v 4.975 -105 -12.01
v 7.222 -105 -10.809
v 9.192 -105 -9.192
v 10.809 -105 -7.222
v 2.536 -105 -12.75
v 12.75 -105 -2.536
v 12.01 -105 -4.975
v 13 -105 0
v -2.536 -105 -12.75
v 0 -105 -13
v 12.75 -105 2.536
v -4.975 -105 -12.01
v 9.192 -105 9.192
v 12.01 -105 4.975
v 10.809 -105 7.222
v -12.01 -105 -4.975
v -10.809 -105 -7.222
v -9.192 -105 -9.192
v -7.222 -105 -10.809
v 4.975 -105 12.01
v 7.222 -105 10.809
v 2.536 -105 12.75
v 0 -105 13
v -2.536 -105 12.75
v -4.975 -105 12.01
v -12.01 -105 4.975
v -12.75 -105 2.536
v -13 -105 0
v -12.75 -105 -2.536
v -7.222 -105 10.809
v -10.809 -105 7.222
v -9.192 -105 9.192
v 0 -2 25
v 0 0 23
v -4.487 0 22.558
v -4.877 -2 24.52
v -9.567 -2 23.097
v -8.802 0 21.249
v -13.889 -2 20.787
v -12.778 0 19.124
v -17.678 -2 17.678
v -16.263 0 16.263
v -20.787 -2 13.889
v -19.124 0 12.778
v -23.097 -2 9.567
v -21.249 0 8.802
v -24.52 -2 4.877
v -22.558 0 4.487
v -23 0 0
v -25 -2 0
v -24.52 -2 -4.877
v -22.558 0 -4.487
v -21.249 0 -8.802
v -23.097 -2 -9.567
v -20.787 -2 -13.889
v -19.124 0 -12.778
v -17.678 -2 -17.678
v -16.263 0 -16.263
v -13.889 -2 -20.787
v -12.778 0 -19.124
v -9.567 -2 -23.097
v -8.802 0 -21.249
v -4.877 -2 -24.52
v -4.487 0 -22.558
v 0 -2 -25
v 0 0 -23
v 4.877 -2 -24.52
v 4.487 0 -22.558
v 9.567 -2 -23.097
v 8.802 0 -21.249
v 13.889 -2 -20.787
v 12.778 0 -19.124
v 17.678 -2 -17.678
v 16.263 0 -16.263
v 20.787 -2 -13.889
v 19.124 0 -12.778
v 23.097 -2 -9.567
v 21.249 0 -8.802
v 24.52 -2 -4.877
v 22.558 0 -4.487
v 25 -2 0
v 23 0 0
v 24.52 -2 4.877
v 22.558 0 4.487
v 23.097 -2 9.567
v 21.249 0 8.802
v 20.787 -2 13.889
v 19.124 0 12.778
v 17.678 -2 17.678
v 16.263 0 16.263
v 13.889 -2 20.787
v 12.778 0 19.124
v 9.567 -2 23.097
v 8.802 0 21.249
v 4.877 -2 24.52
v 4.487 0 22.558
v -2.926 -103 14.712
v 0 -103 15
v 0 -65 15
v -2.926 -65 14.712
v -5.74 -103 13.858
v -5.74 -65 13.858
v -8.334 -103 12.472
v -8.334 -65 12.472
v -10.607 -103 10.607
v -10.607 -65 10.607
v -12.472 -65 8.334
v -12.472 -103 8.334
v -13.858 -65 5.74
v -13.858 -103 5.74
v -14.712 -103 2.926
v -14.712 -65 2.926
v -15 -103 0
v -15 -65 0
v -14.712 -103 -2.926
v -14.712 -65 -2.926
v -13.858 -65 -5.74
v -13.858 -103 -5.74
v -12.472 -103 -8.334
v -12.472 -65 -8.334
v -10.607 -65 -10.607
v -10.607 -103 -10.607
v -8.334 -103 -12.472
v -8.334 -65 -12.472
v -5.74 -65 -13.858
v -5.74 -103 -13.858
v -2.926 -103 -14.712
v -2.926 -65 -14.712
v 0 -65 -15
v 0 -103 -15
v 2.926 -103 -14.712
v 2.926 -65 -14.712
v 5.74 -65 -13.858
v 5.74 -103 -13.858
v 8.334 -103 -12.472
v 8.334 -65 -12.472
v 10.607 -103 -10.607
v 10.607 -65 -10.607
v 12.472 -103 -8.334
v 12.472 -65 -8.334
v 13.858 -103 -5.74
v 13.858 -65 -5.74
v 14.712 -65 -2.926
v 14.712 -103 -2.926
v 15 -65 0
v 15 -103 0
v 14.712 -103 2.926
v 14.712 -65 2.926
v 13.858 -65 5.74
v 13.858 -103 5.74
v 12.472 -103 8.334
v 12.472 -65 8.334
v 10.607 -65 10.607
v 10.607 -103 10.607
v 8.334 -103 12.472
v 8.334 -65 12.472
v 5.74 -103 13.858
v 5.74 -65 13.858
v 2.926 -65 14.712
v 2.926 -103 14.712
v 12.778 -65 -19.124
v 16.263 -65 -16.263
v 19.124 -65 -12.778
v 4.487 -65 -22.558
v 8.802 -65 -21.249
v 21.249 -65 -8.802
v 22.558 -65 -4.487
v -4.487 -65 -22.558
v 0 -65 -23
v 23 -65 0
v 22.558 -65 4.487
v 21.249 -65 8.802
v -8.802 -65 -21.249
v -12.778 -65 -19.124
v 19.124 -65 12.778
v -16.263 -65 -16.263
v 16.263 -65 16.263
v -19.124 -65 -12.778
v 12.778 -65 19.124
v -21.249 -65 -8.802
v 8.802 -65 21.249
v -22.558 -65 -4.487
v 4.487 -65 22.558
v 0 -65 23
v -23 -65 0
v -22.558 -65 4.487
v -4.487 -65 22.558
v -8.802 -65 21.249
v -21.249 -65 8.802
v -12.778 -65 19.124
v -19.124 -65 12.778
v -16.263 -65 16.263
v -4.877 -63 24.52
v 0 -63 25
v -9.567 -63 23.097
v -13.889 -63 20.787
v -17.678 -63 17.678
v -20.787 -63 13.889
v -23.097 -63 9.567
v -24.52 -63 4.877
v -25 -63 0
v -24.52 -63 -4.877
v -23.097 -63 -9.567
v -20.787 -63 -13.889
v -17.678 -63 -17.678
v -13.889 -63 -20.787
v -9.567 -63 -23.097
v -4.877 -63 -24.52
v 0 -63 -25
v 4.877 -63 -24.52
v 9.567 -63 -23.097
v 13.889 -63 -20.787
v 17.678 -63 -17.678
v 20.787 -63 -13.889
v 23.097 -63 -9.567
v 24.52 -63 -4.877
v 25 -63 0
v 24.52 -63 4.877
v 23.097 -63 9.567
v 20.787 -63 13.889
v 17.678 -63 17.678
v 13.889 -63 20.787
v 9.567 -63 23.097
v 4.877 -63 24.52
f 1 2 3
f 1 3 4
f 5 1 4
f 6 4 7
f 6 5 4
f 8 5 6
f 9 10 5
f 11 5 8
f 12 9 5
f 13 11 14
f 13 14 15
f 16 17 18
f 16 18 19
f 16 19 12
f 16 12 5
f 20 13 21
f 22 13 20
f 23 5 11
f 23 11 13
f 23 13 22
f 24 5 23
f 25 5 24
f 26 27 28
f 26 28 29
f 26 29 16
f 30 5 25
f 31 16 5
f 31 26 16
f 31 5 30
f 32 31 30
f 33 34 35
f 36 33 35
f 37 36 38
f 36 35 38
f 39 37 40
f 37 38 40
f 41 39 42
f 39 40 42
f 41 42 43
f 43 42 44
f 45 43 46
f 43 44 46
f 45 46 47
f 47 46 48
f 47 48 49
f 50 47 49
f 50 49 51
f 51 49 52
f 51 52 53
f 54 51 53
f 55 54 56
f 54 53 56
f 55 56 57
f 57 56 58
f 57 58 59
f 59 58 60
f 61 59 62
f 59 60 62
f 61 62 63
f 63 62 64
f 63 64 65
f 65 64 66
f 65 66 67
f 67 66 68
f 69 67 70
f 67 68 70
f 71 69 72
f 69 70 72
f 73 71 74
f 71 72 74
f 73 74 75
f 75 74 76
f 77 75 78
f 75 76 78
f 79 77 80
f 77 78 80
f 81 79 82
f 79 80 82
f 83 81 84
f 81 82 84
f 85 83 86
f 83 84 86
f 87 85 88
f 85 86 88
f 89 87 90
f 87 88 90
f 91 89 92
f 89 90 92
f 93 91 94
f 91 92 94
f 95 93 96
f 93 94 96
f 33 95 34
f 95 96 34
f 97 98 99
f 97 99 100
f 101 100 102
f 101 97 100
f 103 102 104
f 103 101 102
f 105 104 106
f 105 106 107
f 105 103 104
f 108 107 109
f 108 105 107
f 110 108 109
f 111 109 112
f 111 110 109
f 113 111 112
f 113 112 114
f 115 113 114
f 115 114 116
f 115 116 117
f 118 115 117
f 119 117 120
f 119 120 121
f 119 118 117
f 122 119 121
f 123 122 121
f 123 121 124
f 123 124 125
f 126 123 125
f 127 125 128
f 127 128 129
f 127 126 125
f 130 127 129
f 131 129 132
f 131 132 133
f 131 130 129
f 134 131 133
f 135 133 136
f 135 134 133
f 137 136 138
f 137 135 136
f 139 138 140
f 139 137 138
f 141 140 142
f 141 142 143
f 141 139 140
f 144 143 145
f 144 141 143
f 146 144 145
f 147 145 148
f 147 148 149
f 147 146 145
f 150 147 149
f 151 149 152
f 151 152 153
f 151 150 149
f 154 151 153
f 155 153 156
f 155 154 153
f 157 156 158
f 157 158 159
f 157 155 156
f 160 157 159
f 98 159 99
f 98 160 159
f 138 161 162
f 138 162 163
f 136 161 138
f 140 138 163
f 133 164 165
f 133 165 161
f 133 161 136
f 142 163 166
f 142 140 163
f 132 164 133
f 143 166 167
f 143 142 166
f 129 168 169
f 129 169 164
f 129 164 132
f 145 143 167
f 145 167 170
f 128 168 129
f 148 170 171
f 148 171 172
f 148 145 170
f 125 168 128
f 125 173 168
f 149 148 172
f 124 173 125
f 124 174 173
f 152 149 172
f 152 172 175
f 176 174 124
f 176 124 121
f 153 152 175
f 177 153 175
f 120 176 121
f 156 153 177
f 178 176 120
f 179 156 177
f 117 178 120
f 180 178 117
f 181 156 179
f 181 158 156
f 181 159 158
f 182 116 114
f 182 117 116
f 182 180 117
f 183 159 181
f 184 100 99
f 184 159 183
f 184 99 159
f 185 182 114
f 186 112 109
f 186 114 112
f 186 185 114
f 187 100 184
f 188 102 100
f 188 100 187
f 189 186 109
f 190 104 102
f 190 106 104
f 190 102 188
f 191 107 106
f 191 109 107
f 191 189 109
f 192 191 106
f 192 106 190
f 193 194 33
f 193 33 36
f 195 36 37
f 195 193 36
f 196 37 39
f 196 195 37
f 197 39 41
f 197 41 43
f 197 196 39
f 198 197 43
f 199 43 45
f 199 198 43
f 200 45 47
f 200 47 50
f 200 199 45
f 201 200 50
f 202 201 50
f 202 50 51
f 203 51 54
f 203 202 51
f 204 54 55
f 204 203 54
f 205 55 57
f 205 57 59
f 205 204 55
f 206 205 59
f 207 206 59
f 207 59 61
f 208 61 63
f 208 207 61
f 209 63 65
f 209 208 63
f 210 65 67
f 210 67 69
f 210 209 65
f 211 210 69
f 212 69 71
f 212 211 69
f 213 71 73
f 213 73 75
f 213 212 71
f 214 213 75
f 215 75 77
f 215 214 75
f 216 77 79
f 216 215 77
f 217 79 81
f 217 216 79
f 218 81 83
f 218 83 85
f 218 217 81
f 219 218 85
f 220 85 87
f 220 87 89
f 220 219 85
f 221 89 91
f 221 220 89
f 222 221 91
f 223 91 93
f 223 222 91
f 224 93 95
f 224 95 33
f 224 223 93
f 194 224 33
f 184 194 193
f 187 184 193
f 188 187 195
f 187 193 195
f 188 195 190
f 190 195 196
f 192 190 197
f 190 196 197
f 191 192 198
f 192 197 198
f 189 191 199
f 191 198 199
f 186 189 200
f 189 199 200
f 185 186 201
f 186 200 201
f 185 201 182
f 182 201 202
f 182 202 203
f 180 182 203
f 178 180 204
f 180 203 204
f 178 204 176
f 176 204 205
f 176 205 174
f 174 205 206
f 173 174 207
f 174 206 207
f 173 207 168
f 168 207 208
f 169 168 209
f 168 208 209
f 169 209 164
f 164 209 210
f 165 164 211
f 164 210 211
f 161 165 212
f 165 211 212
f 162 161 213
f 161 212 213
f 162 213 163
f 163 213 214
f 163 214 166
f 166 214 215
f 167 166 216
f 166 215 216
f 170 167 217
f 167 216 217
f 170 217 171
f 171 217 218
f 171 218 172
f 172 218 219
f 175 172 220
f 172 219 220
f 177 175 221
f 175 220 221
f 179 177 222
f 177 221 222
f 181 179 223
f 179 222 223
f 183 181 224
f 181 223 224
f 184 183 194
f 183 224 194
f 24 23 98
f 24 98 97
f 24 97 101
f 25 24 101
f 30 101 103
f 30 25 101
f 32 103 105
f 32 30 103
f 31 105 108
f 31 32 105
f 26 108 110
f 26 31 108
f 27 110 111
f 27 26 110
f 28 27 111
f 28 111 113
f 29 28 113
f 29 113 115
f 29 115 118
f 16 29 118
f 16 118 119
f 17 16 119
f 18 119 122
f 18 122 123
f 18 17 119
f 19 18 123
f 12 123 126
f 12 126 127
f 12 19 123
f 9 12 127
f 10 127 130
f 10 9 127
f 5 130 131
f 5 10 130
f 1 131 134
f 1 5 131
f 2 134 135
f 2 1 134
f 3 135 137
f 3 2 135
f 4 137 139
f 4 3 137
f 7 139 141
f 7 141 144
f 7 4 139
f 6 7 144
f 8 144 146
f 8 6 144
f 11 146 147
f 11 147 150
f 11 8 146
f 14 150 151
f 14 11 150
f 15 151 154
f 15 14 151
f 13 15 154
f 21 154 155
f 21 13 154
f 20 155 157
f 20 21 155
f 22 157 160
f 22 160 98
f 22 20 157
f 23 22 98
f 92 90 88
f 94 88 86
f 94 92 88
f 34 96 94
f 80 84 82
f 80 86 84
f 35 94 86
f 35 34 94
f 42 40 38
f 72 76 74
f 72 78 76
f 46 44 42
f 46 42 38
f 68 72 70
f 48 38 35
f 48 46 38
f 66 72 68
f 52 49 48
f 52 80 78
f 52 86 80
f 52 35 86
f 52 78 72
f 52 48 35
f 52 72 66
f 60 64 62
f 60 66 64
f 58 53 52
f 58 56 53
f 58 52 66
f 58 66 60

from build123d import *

# Parameters (mm, degrees)
CHAMFER1_SIZE = 2
CHAMFER2_SIZE = 2


with BuildPart() as part:
    # Sketch1 → Revolve1 (revolve)
    with BuildSketch(Plane.XY, mode=Mode.PRIVATE) as revolve1_sk:
        Polygon((0, 0), (25, 0), (25, -65), (15, -65), (15, -105), (0, -105), align=None)
    revolve(revolve1_sk.sketch.rotate(Axis((0, 0, 0), (0, -1, 0)), 90), axis=Axis((0, 0, 0), (0, -1, 0)))

    # Chamfer1
    chamfer1_edges = [part.edges().sort_by_distance(p)[0] for p in [
        (0, -105, -15),
    ]]
    chamfer(chamfer1_edges, length=CHAMFER1_SIZE)

    # Chamfer2
    chamfer2_edges = [part.edges().sort_by_distance(p)[0] for p in [
        (0, -65, -25),
        (0, 0, -25),
    ]]
    chamfer(chamfer2_edges, length=CHAMFER2_SIZE)


solid = part.part
